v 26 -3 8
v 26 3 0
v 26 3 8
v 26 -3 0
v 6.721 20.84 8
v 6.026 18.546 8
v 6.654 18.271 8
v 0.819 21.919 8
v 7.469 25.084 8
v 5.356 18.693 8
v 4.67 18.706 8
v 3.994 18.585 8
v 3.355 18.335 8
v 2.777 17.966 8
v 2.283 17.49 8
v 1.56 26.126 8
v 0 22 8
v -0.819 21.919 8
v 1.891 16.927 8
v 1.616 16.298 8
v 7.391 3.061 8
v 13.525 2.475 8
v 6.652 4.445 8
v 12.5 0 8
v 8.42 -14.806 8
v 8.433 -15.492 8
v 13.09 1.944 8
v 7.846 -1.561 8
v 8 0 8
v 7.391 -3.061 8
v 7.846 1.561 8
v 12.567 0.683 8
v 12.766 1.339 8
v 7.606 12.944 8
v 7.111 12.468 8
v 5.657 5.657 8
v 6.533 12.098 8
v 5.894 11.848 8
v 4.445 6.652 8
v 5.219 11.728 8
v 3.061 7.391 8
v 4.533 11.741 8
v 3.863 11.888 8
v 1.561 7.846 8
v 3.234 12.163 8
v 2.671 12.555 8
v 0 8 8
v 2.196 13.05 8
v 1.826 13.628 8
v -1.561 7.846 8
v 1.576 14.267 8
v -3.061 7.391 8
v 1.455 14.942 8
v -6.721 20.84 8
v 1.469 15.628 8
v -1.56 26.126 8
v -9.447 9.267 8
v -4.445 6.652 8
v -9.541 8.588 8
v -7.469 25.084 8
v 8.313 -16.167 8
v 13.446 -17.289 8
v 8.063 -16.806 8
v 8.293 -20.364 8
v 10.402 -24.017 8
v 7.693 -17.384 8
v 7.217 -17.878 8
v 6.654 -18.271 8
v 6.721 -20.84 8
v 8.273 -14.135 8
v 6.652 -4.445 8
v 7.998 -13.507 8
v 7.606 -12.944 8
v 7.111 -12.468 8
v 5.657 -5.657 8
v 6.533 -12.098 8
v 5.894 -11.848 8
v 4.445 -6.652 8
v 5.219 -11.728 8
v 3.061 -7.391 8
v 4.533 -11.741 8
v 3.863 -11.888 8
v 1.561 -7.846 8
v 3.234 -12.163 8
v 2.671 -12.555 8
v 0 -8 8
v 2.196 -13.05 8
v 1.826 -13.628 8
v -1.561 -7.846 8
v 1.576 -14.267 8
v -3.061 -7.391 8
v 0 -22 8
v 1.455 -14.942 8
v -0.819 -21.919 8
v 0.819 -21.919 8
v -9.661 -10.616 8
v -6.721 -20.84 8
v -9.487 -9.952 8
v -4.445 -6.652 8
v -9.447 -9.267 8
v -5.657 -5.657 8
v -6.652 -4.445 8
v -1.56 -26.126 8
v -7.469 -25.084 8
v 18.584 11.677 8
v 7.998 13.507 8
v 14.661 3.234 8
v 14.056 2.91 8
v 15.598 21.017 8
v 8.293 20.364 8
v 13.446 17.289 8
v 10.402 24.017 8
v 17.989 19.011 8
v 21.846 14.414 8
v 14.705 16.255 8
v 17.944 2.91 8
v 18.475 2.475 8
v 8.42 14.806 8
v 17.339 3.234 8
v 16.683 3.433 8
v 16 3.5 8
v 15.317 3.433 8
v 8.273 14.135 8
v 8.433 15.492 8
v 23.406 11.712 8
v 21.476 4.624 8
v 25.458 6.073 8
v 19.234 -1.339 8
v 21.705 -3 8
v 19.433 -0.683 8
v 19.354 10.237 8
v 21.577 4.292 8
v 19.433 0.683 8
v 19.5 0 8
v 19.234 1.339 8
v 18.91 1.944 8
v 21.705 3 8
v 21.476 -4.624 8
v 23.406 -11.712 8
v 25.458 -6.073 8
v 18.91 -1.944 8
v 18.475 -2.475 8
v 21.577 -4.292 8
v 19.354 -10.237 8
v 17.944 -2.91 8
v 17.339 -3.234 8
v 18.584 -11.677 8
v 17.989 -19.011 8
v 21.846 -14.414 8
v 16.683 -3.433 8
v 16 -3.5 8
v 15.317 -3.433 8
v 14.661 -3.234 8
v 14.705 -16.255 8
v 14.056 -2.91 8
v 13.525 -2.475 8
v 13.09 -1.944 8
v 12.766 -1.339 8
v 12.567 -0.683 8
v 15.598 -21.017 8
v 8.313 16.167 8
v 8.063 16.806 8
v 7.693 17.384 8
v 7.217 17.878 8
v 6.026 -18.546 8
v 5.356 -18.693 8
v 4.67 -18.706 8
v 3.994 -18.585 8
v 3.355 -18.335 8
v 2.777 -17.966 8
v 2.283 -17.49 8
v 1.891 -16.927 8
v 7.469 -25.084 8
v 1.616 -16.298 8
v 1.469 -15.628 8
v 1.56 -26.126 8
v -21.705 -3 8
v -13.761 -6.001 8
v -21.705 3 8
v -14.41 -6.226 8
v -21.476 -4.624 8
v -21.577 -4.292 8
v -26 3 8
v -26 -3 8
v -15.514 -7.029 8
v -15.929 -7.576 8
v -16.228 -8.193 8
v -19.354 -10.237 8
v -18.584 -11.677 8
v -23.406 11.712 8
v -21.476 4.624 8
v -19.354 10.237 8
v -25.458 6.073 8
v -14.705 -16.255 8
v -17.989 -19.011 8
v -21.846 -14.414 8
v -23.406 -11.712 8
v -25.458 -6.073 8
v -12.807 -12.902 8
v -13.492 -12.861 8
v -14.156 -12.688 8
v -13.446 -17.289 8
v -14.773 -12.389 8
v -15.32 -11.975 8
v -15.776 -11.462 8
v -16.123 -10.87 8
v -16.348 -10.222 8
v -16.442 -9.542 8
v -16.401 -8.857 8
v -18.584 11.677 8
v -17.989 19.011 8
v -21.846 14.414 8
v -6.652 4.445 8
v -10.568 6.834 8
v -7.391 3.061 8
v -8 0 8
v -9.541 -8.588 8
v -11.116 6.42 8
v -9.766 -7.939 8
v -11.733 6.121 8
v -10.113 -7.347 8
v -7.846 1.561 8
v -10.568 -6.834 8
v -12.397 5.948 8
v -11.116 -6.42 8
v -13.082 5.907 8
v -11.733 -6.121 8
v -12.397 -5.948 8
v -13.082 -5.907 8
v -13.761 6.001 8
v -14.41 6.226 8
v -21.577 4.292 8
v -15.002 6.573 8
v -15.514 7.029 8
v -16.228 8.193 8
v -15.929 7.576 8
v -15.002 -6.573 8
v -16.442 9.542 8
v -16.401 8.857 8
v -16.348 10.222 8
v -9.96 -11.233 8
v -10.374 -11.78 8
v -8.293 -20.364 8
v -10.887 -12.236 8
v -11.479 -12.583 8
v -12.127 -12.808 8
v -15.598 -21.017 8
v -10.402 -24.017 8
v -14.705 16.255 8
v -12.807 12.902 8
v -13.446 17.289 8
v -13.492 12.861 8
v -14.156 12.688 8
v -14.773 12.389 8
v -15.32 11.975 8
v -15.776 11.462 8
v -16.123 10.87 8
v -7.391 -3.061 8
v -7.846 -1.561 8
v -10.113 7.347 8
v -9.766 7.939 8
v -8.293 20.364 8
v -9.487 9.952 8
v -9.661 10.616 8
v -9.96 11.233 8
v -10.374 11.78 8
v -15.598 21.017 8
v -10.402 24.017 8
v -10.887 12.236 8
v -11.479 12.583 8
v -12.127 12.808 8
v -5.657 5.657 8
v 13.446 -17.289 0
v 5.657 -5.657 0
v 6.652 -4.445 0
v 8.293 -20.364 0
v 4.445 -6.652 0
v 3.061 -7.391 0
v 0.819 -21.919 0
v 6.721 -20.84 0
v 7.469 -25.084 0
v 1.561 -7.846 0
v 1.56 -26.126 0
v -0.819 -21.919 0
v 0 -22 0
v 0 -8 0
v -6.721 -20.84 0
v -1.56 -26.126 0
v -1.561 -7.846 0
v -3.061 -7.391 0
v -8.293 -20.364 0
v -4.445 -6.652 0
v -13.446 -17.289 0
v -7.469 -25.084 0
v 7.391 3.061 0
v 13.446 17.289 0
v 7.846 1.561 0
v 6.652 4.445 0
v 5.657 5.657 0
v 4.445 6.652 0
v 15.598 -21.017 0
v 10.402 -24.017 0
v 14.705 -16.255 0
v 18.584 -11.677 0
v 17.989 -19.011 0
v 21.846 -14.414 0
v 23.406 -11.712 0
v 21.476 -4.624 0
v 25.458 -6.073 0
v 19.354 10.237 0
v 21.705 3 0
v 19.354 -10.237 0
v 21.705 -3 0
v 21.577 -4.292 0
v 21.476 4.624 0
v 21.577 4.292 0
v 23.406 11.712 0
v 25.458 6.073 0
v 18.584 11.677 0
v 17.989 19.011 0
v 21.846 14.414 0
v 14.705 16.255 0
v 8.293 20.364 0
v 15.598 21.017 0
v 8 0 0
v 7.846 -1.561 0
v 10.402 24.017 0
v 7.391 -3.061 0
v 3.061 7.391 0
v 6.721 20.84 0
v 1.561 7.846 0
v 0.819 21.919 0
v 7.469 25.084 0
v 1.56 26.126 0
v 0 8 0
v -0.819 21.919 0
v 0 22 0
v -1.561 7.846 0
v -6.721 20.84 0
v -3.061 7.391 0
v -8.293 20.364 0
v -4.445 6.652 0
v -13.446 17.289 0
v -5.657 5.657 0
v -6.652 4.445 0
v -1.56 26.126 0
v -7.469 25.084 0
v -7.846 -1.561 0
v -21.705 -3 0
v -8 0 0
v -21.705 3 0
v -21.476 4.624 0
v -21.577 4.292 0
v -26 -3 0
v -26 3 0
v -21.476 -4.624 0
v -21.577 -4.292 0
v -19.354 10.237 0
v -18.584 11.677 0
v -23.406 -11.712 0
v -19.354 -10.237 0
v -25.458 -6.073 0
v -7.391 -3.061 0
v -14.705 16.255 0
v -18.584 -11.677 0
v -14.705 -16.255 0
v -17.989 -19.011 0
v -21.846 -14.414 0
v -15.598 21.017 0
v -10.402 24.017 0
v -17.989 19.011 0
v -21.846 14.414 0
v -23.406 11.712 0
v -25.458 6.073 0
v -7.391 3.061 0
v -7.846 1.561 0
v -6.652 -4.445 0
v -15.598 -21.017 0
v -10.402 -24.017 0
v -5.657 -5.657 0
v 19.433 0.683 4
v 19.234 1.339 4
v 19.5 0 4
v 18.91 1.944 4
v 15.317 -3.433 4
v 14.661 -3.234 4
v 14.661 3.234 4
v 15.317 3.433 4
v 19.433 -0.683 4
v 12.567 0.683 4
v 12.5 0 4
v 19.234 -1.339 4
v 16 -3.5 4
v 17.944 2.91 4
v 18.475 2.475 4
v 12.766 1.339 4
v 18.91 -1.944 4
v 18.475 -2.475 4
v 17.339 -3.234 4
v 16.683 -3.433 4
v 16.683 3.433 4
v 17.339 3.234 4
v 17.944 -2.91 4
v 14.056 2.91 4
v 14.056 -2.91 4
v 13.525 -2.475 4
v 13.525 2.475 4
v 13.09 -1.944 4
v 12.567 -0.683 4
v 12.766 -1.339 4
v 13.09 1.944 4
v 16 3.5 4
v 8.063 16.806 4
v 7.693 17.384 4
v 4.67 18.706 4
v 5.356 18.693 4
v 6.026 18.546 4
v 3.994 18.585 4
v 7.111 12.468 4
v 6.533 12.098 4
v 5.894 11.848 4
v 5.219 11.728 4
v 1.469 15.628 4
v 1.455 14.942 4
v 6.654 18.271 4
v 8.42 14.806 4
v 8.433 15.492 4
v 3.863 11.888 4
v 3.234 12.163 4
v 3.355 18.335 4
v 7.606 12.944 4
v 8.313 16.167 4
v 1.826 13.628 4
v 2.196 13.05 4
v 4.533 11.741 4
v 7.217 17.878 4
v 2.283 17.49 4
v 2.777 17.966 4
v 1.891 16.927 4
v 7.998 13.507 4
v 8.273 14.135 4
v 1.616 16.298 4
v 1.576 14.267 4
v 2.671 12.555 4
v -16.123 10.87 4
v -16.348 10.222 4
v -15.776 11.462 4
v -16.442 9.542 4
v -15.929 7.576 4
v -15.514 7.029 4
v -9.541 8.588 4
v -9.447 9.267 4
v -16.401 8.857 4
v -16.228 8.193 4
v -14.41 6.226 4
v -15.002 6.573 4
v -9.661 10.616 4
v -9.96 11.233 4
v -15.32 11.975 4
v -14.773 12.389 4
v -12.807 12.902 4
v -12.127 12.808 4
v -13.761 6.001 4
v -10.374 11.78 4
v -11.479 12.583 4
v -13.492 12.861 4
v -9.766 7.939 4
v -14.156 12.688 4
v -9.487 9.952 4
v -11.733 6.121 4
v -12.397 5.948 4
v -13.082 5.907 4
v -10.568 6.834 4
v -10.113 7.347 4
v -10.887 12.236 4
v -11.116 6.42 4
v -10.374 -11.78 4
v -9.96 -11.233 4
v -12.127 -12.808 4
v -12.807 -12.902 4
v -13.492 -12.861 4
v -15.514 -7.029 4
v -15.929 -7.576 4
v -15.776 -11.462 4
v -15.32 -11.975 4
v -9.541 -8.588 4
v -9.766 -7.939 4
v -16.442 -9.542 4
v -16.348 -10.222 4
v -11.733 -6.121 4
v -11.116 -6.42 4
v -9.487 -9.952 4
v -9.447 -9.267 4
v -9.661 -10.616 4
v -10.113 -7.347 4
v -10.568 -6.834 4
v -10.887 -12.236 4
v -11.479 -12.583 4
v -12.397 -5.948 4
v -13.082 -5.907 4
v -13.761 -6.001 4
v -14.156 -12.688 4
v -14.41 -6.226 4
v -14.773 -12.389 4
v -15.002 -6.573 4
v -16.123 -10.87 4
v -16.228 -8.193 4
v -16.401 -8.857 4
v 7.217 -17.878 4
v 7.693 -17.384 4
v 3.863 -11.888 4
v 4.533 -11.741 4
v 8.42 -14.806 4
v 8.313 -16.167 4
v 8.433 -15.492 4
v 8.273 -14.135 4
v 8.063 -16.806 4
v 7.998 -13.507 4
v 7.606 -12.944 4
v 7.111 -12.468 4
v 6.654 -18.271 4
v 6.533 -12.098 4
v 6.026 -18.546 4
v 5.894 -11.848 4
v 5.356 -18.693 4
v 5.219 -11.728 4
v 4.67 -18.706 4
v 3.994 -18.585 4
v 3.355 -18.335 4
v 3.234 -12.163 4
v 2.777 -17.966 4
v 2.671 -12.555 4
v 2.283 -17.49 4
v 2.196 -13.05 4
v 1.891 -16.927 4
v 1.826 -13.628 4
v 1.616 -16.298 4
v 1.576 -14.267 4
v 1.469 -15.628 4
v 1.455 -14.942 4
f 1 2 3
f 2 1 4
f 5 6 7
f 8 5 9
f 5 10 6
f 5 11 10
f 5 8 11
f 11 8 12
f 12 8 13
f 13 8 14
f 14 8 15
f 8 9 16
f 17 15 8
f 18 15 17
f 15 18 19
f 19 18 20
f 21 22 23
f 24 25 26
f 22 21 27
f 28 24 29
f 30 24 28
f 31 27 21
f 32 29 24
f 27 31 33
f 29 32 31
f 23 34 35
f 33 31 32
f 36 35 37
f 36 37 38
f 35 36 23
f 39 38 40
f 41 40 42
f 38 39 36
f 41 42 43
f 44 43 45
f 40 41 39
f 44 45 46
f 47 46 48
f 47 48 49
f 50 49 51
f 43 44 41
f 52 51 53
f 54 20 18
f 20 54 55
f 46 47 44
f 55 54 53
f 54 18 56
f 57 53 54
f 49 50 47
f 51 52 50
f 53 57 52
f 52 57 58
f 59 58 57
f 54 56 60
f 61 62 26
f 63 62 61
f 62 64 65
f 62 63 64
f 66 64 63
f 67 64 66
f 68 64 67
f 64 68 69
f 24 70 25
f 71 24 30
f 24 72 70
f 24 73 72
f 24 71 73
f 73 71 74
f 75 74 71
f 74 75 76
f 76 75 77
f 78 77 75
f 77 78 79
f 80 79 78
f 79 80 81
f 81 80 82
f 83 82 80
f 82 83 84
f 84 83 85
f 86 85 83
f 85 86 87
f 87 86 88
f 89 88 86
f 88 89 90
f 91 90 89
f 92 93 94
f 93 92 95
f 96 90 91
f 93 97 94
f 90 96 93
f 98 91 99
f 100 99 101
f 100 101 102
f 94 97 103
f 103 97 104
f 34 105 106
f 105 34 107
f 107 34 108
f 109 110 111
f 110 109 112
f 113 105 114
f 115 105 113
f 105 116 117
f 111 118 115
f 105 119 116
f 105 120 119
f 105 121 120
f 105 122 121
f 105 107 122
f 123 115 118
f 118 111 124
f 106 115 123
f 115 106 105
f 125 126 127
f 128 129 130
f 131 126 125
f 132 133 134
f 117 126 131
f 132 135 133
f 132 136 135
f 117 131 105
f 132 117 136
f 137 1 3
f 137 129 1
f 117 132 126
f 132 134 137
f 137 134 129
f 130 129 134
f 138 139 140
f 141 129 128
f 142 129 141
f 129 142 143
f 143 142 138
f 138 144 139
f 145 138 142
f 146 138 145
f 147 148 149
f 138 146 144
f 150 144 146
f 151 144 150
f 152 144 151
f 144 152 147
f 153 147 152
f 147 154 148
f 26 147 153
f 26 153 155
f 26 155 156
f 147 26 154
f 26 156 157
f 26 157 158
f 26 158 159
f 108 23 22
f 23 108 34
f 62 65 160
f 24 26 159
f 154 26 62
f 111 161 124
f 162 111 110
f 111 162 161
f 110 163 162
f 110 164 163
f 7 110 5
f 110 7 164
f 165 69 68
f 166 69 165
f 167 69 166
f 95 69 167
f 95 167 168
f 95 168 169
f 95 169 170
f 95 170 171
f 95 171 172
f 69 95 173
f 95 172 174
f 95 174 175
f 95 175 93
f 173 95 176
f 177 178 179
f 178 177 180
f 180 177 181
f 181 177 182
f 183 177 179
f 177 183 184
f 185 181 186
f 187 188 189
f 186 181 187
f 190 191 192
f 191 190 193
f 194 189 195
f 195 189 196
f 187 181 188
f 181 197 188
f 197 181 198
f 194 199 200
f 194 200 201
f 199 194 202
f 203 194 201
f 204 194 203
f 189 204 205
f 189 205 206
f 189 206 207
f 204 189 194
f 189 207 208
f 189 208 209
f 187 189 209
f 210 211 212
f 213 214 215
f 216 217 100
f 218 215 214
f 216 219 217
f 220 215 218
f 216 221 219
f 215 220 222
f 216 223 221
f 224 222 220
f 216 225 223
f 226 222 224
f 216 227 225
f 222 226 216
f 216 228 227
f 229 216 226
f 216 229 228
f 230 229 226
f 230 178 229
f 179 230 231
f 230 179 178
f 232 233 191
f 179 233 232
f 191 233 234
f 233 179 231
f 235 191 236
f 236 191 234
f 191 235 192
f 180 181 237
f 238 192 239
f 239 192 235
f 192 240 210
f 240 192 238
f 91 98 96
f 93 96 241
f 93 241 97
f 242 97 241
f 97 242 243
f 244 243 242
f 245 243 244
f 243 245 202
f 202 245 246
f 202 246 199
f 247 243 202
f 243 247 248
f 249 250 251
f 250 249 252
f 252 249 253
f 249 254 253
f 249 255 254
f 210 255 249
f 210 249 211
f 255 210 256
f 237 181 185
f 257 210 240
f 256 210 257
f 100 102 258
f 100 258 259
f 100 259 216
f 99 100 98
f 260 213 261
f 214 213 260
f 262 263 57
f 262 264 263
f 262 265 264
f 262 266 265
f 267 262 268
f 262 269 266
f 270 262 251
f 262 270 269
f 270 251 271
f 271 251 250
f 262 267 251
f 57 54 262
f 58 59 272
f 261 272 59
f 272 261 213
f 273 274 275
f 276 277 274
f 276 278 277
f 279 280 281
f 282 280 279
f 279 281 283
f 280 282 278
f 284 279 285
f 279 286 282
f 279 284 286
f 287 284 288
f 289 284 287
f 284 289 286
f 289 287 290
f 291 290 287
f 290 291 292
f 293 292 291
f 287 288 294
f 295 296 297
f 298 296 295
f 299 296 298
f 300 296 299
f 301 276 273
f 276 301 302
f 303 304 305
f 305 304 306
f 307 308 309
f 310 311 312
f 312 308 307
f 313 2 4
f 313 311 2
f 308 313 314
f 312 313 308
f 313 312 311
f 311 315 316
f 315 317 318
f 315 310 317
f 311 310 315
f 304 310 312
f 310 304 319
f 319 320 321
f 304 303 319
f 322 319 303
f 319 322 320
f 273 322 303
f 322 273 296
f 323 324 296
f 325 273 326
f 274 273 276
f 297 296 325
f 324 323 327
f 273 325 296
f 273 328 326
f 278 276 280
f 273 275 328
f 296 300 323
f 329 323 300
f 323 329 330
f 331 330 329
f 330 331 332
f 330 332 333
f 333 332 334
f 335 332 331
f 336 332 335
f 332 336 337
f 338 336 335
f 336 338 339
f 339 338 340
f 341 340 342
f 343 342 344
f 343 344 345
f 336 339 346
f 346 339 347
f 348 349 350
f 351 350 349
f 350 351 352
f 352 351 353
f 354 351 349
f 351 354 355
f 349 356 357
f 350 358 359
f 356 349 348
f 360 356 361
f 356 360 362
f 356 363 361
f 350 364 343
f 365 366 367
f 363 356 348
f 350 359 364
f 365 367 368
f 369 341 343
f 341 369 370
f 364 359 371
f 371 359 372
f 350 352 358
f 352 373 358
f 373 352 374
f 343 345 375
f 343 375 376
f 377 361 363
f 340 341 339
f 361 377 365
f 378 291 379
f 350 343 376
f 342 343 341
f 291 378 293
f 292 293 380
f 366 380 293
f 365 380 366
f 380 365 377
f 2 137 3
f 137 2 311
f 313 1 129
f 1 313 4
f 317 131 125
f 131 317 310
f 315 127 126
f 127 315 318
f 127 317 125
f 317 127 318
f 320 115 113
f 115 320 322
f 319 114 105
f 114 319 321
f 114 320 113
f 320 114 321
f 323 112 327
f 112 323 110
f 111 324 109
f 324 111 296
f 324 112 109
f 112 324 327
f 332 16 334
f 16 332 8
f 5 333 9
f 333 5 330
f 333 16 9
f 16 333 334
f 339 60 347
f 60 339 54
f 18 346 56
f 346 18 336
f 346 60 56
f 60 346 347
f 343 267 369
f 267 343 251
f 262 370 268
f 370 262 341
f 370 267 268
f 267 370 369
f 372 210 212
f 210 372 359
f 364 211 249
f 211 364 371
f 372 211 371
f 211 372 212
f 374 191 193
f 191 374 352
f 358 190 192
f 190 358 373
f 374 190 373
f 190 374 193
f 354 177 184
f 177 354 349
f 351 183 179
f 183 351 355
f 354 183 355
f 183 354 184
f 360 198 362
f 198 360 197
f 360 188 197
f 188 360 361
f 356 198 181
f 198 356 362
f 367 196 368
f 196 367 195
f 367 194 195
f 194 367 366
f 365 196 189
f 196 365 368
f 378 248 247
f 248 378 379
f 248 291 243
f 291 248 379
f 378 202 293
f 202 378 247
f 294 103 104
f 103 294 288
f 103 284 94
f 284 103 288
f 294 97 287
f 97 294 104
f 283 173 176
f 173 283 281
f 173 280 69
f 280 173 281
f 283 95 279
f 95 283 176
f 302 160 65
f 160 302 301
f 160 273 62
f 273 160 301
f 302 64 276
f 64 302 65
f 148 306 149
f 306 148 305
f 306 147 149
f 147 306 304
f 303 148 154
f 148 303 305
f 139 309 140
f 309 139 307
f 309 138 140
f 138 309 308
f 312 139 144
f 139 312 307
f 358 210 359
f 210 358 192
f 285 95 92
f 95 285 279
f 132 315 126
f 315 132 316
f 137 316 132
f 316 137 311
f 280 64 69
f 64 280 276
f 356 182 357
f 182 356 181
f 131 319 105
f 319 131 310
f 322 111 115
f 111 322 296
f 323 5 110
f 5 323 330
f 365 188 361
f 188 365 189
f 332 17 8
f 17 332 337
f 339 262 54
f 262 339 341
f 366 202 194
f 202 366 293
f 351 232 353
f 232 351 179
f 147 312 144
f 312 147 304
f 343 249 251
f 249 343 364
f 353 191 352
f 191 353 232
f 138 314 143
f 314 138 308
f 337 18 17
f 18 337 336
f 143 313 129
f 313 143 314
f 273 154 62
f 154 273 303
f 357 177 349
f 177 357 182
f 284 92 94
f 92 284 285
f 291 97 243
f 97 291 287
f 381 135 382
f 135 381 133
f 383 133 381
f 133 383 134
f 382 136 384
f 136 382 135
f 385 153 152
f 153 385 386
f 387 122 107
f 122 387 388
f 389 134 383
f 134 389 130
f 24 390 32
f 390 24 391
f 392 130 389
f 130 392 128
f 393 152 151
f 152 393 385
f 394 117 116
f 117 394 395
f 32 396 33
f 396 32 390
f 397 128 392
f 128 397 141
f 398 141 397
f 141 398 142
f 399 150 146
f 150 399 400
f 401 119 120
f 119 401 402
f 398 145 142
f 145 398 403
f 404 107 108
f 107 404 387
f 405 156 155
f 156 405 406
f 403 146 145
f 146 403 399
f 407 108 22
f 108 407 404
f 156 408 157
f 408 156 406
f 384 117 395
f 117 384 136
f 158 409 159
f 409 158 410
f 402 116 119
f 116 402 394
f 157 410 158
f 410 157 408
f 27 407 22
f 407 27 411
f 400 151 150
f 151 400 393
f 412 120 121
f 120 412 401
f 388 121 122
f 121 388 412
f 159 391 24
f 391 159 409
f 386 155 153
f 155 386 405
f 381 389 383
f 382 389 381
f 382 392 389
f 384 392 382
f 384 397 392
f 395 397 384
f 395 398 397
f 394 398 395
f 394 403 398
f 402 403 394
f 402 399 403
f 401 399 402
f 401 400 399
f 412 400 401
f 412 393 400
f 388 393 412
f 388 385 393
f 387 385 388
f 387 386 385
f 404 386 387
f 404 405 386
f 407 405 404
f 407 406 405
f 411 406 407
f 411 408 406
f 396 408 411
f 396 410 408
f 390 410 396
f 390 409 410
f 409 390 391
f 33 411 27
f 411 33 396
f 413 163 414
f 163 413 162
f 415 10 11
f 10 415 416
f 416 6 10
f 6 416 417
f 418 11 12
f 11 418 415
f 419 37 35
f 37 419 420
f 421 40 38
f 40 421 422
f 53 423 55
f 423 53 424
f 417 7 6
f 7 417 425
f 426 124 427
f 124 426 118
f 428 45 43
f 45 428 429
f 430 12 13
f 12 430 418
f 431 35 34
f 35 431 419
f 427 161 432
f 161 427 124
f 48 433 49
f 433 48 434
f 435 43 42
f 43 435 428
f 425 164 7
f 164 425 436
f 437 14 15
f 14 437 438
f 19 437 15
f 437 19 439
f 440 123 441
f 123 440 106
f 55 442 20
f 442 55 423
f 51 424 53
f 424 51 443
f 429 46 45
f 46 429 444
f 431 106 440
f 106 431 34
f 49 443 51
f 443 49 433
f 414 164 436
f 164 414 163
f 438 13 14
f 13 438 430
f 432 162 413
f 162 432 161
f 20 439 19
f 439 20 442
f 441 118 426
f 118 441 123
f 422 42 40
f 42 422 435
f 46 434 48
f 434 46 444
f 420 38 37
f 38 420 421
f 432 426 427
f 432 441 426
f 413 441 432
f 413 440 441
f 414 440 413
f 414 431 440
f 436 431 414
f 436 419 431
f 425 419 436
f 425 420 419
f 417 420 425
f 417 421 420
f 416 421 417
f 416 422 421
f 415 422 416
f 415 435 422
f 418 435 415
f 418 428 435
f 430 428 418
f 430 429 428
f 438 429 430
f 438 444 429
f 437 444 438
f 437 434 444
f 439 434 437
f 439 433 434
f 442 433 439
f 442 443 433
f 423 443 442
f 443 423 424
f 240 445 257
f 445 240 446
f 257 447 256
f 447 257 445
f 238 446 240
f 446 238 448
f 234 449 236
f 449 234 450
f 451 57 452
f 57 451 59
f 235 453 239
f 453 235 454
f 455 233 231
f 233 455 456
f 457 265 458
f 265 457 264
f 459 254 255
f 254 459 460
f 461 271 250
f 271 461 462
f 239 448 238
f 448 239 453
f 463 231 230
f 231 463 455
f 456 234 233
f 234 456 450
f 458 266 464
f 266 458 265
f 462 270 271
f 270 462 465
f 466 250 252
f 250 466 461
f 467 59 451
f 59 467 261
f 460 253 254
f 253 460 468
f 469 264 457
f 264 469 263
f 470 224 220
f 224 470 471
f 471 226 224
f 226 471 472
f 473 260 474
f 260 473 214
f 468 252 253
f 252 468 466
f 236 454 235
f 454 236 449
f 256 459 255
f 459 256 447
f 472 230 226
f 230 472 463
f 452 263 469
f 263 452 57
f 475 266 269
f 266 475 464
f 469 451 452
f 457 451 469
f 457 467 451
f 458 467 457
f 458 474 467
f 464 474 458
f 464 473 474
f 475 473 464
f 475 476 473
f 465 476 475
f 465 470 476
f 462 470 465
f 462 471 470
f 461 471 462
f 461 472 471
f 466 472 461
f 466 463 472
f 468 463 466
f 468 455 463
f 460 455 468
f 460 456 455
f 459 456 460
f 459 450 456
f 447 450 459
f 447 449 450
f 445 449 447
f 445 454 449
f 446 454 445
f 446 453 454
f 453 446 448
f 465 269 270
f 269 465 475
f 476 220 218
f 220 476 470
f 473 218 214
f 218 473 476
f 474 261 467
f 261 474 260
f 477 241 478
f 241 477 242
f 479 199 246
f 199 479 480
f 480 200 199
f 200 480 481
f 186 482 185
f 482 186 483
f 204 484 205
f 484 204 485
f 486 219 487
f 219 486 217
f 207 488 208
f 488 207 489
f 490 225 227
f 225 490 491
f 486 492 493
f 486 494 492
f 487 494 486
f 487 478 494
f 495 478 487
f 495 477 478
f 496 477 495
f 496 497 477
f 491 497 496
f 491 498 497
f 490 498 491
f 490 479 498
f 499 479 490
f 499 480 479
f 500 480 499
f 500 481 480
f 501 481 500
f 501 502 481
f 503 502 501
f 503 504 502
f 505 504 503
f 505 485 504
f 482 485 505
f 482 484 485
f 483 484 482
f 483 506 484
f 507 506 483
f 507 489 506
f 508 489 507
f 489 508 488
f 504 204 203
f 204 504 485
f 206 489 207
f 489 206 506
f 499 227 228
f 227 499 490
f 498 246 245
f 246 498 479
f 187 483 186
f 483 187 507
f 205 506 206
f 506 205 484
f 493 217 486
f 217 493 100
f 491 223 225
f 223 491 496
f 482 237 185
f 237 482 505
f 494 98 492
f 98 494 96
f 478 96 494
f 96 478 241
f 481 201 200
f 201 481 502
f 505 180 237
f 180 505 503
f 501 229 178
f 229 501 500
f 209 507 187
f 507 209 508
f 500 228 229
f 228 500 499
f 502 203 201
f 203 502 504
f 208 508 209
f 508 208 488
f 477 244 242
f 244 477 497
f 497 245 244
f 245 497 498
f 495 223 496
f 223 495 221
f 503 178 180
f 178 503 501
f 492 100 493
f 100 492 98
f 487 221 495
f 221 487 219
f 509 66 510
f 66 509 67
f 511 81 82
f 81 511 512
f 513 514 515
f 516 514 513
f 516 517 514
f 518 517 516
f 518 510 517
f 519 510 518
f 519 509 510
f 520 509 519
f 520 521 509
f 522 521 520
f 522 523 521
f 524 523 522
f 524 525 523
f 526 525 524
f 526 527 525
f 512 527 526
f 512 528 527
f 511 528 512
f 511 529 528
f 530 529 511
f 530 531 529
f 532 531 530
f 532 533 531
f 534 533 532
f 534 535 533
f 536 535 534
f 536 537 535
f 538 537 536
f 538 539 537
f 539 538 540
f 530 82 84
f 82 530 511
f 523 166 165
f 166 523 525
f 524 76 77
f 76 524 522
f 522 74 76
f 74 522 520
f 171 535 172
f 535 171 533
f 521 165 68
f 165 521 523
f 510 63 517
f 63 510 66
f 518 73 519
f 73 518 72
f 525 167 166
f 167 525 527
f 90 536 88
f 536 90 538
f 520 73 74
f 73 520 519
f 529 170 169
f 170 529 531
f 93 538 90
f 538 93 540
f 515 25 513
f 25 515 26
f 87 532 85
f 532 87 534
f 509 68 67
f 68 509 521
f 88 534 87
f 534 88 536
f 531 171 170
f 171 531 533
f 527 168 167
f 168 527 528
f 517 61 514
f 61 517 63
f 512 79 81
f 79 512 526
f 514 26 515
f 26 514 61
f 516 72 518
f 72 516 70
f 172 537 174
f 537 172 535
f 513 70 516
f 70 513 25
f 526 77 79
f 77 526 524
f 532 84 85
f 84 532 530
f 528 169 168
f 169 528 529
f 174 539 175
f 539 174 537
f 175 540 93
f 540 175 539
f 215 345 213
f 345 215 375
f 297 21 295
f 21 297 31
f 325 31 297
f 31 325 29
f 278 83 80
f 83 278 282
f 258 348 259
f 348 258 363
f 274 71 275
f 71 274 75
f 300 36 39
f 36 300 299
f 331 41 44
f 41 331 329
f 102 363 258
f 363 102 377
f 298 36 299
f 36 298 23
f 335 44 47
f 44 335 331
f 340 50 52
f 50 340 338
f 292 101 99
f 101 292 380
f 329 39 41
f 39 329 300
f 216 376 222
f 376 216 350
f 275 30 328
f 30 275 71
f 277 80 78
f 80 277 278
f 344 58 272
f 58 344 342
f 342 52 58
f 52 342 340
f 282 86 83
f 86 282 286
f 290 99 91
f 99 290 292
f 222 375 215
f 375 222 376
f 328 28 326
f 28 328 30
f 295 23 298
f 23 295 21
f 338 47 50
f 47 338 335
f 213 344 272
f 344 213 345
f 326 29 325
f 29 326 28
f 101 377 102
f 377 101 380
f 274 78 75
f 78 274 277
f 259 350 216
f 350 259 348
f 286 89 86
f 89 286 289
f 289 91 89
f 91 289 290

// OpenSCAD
$fn = 32;

// ----------------------------------------------------------------------
// Spur blank: lightened gear blank
// ----------------------------------------------------------------------

// --- parameters (mm) ---
disc_r = 22;              // blank root radius
disc_t = 8;               // blank thickness
n_teeth = 18;             // stub tooth count
tooth_w = 6;              // tooth width at the root
tooth_h = 4;              // tooth height above the root
bore_r = 8;               // central bore radius
ring_r = 16;              // lightening pocket ring radius
pocket_r = 3.5;           // lightening pocket radius
fit_tol = 0.05;           // tolerance for press fits, mm
free_tol = 0.2;           // tolerance for clearance fits, mm

out_r = disc_r + tooth_h;  // tip radius
bbox_x = 52.0;  // measured width over the teeth
bbox_y = 52.25;  // measured depth over the teeth

difference() {
union() {
  cylinder(r = disc_r, h = disc_t);
  for (i = [0 : n_teeth - 1])
    rotate([0, 0, i * 360 / n_teeth])
      translate([disc_r - 1, -tooth_w / 2, 0])
        cube([tooth_h + 1, tooth_w, disc_t]);
}
  translate([0, 0, -1]) cylinder(r = bore_r, h = disc_t + 2);
  for (i = [0 : 5])
    rotate([0, 0, i * 72])
      translate([ring_r, 0, disc_t - 4])
        cylinder(r = pocket_r, h = 5);
}
